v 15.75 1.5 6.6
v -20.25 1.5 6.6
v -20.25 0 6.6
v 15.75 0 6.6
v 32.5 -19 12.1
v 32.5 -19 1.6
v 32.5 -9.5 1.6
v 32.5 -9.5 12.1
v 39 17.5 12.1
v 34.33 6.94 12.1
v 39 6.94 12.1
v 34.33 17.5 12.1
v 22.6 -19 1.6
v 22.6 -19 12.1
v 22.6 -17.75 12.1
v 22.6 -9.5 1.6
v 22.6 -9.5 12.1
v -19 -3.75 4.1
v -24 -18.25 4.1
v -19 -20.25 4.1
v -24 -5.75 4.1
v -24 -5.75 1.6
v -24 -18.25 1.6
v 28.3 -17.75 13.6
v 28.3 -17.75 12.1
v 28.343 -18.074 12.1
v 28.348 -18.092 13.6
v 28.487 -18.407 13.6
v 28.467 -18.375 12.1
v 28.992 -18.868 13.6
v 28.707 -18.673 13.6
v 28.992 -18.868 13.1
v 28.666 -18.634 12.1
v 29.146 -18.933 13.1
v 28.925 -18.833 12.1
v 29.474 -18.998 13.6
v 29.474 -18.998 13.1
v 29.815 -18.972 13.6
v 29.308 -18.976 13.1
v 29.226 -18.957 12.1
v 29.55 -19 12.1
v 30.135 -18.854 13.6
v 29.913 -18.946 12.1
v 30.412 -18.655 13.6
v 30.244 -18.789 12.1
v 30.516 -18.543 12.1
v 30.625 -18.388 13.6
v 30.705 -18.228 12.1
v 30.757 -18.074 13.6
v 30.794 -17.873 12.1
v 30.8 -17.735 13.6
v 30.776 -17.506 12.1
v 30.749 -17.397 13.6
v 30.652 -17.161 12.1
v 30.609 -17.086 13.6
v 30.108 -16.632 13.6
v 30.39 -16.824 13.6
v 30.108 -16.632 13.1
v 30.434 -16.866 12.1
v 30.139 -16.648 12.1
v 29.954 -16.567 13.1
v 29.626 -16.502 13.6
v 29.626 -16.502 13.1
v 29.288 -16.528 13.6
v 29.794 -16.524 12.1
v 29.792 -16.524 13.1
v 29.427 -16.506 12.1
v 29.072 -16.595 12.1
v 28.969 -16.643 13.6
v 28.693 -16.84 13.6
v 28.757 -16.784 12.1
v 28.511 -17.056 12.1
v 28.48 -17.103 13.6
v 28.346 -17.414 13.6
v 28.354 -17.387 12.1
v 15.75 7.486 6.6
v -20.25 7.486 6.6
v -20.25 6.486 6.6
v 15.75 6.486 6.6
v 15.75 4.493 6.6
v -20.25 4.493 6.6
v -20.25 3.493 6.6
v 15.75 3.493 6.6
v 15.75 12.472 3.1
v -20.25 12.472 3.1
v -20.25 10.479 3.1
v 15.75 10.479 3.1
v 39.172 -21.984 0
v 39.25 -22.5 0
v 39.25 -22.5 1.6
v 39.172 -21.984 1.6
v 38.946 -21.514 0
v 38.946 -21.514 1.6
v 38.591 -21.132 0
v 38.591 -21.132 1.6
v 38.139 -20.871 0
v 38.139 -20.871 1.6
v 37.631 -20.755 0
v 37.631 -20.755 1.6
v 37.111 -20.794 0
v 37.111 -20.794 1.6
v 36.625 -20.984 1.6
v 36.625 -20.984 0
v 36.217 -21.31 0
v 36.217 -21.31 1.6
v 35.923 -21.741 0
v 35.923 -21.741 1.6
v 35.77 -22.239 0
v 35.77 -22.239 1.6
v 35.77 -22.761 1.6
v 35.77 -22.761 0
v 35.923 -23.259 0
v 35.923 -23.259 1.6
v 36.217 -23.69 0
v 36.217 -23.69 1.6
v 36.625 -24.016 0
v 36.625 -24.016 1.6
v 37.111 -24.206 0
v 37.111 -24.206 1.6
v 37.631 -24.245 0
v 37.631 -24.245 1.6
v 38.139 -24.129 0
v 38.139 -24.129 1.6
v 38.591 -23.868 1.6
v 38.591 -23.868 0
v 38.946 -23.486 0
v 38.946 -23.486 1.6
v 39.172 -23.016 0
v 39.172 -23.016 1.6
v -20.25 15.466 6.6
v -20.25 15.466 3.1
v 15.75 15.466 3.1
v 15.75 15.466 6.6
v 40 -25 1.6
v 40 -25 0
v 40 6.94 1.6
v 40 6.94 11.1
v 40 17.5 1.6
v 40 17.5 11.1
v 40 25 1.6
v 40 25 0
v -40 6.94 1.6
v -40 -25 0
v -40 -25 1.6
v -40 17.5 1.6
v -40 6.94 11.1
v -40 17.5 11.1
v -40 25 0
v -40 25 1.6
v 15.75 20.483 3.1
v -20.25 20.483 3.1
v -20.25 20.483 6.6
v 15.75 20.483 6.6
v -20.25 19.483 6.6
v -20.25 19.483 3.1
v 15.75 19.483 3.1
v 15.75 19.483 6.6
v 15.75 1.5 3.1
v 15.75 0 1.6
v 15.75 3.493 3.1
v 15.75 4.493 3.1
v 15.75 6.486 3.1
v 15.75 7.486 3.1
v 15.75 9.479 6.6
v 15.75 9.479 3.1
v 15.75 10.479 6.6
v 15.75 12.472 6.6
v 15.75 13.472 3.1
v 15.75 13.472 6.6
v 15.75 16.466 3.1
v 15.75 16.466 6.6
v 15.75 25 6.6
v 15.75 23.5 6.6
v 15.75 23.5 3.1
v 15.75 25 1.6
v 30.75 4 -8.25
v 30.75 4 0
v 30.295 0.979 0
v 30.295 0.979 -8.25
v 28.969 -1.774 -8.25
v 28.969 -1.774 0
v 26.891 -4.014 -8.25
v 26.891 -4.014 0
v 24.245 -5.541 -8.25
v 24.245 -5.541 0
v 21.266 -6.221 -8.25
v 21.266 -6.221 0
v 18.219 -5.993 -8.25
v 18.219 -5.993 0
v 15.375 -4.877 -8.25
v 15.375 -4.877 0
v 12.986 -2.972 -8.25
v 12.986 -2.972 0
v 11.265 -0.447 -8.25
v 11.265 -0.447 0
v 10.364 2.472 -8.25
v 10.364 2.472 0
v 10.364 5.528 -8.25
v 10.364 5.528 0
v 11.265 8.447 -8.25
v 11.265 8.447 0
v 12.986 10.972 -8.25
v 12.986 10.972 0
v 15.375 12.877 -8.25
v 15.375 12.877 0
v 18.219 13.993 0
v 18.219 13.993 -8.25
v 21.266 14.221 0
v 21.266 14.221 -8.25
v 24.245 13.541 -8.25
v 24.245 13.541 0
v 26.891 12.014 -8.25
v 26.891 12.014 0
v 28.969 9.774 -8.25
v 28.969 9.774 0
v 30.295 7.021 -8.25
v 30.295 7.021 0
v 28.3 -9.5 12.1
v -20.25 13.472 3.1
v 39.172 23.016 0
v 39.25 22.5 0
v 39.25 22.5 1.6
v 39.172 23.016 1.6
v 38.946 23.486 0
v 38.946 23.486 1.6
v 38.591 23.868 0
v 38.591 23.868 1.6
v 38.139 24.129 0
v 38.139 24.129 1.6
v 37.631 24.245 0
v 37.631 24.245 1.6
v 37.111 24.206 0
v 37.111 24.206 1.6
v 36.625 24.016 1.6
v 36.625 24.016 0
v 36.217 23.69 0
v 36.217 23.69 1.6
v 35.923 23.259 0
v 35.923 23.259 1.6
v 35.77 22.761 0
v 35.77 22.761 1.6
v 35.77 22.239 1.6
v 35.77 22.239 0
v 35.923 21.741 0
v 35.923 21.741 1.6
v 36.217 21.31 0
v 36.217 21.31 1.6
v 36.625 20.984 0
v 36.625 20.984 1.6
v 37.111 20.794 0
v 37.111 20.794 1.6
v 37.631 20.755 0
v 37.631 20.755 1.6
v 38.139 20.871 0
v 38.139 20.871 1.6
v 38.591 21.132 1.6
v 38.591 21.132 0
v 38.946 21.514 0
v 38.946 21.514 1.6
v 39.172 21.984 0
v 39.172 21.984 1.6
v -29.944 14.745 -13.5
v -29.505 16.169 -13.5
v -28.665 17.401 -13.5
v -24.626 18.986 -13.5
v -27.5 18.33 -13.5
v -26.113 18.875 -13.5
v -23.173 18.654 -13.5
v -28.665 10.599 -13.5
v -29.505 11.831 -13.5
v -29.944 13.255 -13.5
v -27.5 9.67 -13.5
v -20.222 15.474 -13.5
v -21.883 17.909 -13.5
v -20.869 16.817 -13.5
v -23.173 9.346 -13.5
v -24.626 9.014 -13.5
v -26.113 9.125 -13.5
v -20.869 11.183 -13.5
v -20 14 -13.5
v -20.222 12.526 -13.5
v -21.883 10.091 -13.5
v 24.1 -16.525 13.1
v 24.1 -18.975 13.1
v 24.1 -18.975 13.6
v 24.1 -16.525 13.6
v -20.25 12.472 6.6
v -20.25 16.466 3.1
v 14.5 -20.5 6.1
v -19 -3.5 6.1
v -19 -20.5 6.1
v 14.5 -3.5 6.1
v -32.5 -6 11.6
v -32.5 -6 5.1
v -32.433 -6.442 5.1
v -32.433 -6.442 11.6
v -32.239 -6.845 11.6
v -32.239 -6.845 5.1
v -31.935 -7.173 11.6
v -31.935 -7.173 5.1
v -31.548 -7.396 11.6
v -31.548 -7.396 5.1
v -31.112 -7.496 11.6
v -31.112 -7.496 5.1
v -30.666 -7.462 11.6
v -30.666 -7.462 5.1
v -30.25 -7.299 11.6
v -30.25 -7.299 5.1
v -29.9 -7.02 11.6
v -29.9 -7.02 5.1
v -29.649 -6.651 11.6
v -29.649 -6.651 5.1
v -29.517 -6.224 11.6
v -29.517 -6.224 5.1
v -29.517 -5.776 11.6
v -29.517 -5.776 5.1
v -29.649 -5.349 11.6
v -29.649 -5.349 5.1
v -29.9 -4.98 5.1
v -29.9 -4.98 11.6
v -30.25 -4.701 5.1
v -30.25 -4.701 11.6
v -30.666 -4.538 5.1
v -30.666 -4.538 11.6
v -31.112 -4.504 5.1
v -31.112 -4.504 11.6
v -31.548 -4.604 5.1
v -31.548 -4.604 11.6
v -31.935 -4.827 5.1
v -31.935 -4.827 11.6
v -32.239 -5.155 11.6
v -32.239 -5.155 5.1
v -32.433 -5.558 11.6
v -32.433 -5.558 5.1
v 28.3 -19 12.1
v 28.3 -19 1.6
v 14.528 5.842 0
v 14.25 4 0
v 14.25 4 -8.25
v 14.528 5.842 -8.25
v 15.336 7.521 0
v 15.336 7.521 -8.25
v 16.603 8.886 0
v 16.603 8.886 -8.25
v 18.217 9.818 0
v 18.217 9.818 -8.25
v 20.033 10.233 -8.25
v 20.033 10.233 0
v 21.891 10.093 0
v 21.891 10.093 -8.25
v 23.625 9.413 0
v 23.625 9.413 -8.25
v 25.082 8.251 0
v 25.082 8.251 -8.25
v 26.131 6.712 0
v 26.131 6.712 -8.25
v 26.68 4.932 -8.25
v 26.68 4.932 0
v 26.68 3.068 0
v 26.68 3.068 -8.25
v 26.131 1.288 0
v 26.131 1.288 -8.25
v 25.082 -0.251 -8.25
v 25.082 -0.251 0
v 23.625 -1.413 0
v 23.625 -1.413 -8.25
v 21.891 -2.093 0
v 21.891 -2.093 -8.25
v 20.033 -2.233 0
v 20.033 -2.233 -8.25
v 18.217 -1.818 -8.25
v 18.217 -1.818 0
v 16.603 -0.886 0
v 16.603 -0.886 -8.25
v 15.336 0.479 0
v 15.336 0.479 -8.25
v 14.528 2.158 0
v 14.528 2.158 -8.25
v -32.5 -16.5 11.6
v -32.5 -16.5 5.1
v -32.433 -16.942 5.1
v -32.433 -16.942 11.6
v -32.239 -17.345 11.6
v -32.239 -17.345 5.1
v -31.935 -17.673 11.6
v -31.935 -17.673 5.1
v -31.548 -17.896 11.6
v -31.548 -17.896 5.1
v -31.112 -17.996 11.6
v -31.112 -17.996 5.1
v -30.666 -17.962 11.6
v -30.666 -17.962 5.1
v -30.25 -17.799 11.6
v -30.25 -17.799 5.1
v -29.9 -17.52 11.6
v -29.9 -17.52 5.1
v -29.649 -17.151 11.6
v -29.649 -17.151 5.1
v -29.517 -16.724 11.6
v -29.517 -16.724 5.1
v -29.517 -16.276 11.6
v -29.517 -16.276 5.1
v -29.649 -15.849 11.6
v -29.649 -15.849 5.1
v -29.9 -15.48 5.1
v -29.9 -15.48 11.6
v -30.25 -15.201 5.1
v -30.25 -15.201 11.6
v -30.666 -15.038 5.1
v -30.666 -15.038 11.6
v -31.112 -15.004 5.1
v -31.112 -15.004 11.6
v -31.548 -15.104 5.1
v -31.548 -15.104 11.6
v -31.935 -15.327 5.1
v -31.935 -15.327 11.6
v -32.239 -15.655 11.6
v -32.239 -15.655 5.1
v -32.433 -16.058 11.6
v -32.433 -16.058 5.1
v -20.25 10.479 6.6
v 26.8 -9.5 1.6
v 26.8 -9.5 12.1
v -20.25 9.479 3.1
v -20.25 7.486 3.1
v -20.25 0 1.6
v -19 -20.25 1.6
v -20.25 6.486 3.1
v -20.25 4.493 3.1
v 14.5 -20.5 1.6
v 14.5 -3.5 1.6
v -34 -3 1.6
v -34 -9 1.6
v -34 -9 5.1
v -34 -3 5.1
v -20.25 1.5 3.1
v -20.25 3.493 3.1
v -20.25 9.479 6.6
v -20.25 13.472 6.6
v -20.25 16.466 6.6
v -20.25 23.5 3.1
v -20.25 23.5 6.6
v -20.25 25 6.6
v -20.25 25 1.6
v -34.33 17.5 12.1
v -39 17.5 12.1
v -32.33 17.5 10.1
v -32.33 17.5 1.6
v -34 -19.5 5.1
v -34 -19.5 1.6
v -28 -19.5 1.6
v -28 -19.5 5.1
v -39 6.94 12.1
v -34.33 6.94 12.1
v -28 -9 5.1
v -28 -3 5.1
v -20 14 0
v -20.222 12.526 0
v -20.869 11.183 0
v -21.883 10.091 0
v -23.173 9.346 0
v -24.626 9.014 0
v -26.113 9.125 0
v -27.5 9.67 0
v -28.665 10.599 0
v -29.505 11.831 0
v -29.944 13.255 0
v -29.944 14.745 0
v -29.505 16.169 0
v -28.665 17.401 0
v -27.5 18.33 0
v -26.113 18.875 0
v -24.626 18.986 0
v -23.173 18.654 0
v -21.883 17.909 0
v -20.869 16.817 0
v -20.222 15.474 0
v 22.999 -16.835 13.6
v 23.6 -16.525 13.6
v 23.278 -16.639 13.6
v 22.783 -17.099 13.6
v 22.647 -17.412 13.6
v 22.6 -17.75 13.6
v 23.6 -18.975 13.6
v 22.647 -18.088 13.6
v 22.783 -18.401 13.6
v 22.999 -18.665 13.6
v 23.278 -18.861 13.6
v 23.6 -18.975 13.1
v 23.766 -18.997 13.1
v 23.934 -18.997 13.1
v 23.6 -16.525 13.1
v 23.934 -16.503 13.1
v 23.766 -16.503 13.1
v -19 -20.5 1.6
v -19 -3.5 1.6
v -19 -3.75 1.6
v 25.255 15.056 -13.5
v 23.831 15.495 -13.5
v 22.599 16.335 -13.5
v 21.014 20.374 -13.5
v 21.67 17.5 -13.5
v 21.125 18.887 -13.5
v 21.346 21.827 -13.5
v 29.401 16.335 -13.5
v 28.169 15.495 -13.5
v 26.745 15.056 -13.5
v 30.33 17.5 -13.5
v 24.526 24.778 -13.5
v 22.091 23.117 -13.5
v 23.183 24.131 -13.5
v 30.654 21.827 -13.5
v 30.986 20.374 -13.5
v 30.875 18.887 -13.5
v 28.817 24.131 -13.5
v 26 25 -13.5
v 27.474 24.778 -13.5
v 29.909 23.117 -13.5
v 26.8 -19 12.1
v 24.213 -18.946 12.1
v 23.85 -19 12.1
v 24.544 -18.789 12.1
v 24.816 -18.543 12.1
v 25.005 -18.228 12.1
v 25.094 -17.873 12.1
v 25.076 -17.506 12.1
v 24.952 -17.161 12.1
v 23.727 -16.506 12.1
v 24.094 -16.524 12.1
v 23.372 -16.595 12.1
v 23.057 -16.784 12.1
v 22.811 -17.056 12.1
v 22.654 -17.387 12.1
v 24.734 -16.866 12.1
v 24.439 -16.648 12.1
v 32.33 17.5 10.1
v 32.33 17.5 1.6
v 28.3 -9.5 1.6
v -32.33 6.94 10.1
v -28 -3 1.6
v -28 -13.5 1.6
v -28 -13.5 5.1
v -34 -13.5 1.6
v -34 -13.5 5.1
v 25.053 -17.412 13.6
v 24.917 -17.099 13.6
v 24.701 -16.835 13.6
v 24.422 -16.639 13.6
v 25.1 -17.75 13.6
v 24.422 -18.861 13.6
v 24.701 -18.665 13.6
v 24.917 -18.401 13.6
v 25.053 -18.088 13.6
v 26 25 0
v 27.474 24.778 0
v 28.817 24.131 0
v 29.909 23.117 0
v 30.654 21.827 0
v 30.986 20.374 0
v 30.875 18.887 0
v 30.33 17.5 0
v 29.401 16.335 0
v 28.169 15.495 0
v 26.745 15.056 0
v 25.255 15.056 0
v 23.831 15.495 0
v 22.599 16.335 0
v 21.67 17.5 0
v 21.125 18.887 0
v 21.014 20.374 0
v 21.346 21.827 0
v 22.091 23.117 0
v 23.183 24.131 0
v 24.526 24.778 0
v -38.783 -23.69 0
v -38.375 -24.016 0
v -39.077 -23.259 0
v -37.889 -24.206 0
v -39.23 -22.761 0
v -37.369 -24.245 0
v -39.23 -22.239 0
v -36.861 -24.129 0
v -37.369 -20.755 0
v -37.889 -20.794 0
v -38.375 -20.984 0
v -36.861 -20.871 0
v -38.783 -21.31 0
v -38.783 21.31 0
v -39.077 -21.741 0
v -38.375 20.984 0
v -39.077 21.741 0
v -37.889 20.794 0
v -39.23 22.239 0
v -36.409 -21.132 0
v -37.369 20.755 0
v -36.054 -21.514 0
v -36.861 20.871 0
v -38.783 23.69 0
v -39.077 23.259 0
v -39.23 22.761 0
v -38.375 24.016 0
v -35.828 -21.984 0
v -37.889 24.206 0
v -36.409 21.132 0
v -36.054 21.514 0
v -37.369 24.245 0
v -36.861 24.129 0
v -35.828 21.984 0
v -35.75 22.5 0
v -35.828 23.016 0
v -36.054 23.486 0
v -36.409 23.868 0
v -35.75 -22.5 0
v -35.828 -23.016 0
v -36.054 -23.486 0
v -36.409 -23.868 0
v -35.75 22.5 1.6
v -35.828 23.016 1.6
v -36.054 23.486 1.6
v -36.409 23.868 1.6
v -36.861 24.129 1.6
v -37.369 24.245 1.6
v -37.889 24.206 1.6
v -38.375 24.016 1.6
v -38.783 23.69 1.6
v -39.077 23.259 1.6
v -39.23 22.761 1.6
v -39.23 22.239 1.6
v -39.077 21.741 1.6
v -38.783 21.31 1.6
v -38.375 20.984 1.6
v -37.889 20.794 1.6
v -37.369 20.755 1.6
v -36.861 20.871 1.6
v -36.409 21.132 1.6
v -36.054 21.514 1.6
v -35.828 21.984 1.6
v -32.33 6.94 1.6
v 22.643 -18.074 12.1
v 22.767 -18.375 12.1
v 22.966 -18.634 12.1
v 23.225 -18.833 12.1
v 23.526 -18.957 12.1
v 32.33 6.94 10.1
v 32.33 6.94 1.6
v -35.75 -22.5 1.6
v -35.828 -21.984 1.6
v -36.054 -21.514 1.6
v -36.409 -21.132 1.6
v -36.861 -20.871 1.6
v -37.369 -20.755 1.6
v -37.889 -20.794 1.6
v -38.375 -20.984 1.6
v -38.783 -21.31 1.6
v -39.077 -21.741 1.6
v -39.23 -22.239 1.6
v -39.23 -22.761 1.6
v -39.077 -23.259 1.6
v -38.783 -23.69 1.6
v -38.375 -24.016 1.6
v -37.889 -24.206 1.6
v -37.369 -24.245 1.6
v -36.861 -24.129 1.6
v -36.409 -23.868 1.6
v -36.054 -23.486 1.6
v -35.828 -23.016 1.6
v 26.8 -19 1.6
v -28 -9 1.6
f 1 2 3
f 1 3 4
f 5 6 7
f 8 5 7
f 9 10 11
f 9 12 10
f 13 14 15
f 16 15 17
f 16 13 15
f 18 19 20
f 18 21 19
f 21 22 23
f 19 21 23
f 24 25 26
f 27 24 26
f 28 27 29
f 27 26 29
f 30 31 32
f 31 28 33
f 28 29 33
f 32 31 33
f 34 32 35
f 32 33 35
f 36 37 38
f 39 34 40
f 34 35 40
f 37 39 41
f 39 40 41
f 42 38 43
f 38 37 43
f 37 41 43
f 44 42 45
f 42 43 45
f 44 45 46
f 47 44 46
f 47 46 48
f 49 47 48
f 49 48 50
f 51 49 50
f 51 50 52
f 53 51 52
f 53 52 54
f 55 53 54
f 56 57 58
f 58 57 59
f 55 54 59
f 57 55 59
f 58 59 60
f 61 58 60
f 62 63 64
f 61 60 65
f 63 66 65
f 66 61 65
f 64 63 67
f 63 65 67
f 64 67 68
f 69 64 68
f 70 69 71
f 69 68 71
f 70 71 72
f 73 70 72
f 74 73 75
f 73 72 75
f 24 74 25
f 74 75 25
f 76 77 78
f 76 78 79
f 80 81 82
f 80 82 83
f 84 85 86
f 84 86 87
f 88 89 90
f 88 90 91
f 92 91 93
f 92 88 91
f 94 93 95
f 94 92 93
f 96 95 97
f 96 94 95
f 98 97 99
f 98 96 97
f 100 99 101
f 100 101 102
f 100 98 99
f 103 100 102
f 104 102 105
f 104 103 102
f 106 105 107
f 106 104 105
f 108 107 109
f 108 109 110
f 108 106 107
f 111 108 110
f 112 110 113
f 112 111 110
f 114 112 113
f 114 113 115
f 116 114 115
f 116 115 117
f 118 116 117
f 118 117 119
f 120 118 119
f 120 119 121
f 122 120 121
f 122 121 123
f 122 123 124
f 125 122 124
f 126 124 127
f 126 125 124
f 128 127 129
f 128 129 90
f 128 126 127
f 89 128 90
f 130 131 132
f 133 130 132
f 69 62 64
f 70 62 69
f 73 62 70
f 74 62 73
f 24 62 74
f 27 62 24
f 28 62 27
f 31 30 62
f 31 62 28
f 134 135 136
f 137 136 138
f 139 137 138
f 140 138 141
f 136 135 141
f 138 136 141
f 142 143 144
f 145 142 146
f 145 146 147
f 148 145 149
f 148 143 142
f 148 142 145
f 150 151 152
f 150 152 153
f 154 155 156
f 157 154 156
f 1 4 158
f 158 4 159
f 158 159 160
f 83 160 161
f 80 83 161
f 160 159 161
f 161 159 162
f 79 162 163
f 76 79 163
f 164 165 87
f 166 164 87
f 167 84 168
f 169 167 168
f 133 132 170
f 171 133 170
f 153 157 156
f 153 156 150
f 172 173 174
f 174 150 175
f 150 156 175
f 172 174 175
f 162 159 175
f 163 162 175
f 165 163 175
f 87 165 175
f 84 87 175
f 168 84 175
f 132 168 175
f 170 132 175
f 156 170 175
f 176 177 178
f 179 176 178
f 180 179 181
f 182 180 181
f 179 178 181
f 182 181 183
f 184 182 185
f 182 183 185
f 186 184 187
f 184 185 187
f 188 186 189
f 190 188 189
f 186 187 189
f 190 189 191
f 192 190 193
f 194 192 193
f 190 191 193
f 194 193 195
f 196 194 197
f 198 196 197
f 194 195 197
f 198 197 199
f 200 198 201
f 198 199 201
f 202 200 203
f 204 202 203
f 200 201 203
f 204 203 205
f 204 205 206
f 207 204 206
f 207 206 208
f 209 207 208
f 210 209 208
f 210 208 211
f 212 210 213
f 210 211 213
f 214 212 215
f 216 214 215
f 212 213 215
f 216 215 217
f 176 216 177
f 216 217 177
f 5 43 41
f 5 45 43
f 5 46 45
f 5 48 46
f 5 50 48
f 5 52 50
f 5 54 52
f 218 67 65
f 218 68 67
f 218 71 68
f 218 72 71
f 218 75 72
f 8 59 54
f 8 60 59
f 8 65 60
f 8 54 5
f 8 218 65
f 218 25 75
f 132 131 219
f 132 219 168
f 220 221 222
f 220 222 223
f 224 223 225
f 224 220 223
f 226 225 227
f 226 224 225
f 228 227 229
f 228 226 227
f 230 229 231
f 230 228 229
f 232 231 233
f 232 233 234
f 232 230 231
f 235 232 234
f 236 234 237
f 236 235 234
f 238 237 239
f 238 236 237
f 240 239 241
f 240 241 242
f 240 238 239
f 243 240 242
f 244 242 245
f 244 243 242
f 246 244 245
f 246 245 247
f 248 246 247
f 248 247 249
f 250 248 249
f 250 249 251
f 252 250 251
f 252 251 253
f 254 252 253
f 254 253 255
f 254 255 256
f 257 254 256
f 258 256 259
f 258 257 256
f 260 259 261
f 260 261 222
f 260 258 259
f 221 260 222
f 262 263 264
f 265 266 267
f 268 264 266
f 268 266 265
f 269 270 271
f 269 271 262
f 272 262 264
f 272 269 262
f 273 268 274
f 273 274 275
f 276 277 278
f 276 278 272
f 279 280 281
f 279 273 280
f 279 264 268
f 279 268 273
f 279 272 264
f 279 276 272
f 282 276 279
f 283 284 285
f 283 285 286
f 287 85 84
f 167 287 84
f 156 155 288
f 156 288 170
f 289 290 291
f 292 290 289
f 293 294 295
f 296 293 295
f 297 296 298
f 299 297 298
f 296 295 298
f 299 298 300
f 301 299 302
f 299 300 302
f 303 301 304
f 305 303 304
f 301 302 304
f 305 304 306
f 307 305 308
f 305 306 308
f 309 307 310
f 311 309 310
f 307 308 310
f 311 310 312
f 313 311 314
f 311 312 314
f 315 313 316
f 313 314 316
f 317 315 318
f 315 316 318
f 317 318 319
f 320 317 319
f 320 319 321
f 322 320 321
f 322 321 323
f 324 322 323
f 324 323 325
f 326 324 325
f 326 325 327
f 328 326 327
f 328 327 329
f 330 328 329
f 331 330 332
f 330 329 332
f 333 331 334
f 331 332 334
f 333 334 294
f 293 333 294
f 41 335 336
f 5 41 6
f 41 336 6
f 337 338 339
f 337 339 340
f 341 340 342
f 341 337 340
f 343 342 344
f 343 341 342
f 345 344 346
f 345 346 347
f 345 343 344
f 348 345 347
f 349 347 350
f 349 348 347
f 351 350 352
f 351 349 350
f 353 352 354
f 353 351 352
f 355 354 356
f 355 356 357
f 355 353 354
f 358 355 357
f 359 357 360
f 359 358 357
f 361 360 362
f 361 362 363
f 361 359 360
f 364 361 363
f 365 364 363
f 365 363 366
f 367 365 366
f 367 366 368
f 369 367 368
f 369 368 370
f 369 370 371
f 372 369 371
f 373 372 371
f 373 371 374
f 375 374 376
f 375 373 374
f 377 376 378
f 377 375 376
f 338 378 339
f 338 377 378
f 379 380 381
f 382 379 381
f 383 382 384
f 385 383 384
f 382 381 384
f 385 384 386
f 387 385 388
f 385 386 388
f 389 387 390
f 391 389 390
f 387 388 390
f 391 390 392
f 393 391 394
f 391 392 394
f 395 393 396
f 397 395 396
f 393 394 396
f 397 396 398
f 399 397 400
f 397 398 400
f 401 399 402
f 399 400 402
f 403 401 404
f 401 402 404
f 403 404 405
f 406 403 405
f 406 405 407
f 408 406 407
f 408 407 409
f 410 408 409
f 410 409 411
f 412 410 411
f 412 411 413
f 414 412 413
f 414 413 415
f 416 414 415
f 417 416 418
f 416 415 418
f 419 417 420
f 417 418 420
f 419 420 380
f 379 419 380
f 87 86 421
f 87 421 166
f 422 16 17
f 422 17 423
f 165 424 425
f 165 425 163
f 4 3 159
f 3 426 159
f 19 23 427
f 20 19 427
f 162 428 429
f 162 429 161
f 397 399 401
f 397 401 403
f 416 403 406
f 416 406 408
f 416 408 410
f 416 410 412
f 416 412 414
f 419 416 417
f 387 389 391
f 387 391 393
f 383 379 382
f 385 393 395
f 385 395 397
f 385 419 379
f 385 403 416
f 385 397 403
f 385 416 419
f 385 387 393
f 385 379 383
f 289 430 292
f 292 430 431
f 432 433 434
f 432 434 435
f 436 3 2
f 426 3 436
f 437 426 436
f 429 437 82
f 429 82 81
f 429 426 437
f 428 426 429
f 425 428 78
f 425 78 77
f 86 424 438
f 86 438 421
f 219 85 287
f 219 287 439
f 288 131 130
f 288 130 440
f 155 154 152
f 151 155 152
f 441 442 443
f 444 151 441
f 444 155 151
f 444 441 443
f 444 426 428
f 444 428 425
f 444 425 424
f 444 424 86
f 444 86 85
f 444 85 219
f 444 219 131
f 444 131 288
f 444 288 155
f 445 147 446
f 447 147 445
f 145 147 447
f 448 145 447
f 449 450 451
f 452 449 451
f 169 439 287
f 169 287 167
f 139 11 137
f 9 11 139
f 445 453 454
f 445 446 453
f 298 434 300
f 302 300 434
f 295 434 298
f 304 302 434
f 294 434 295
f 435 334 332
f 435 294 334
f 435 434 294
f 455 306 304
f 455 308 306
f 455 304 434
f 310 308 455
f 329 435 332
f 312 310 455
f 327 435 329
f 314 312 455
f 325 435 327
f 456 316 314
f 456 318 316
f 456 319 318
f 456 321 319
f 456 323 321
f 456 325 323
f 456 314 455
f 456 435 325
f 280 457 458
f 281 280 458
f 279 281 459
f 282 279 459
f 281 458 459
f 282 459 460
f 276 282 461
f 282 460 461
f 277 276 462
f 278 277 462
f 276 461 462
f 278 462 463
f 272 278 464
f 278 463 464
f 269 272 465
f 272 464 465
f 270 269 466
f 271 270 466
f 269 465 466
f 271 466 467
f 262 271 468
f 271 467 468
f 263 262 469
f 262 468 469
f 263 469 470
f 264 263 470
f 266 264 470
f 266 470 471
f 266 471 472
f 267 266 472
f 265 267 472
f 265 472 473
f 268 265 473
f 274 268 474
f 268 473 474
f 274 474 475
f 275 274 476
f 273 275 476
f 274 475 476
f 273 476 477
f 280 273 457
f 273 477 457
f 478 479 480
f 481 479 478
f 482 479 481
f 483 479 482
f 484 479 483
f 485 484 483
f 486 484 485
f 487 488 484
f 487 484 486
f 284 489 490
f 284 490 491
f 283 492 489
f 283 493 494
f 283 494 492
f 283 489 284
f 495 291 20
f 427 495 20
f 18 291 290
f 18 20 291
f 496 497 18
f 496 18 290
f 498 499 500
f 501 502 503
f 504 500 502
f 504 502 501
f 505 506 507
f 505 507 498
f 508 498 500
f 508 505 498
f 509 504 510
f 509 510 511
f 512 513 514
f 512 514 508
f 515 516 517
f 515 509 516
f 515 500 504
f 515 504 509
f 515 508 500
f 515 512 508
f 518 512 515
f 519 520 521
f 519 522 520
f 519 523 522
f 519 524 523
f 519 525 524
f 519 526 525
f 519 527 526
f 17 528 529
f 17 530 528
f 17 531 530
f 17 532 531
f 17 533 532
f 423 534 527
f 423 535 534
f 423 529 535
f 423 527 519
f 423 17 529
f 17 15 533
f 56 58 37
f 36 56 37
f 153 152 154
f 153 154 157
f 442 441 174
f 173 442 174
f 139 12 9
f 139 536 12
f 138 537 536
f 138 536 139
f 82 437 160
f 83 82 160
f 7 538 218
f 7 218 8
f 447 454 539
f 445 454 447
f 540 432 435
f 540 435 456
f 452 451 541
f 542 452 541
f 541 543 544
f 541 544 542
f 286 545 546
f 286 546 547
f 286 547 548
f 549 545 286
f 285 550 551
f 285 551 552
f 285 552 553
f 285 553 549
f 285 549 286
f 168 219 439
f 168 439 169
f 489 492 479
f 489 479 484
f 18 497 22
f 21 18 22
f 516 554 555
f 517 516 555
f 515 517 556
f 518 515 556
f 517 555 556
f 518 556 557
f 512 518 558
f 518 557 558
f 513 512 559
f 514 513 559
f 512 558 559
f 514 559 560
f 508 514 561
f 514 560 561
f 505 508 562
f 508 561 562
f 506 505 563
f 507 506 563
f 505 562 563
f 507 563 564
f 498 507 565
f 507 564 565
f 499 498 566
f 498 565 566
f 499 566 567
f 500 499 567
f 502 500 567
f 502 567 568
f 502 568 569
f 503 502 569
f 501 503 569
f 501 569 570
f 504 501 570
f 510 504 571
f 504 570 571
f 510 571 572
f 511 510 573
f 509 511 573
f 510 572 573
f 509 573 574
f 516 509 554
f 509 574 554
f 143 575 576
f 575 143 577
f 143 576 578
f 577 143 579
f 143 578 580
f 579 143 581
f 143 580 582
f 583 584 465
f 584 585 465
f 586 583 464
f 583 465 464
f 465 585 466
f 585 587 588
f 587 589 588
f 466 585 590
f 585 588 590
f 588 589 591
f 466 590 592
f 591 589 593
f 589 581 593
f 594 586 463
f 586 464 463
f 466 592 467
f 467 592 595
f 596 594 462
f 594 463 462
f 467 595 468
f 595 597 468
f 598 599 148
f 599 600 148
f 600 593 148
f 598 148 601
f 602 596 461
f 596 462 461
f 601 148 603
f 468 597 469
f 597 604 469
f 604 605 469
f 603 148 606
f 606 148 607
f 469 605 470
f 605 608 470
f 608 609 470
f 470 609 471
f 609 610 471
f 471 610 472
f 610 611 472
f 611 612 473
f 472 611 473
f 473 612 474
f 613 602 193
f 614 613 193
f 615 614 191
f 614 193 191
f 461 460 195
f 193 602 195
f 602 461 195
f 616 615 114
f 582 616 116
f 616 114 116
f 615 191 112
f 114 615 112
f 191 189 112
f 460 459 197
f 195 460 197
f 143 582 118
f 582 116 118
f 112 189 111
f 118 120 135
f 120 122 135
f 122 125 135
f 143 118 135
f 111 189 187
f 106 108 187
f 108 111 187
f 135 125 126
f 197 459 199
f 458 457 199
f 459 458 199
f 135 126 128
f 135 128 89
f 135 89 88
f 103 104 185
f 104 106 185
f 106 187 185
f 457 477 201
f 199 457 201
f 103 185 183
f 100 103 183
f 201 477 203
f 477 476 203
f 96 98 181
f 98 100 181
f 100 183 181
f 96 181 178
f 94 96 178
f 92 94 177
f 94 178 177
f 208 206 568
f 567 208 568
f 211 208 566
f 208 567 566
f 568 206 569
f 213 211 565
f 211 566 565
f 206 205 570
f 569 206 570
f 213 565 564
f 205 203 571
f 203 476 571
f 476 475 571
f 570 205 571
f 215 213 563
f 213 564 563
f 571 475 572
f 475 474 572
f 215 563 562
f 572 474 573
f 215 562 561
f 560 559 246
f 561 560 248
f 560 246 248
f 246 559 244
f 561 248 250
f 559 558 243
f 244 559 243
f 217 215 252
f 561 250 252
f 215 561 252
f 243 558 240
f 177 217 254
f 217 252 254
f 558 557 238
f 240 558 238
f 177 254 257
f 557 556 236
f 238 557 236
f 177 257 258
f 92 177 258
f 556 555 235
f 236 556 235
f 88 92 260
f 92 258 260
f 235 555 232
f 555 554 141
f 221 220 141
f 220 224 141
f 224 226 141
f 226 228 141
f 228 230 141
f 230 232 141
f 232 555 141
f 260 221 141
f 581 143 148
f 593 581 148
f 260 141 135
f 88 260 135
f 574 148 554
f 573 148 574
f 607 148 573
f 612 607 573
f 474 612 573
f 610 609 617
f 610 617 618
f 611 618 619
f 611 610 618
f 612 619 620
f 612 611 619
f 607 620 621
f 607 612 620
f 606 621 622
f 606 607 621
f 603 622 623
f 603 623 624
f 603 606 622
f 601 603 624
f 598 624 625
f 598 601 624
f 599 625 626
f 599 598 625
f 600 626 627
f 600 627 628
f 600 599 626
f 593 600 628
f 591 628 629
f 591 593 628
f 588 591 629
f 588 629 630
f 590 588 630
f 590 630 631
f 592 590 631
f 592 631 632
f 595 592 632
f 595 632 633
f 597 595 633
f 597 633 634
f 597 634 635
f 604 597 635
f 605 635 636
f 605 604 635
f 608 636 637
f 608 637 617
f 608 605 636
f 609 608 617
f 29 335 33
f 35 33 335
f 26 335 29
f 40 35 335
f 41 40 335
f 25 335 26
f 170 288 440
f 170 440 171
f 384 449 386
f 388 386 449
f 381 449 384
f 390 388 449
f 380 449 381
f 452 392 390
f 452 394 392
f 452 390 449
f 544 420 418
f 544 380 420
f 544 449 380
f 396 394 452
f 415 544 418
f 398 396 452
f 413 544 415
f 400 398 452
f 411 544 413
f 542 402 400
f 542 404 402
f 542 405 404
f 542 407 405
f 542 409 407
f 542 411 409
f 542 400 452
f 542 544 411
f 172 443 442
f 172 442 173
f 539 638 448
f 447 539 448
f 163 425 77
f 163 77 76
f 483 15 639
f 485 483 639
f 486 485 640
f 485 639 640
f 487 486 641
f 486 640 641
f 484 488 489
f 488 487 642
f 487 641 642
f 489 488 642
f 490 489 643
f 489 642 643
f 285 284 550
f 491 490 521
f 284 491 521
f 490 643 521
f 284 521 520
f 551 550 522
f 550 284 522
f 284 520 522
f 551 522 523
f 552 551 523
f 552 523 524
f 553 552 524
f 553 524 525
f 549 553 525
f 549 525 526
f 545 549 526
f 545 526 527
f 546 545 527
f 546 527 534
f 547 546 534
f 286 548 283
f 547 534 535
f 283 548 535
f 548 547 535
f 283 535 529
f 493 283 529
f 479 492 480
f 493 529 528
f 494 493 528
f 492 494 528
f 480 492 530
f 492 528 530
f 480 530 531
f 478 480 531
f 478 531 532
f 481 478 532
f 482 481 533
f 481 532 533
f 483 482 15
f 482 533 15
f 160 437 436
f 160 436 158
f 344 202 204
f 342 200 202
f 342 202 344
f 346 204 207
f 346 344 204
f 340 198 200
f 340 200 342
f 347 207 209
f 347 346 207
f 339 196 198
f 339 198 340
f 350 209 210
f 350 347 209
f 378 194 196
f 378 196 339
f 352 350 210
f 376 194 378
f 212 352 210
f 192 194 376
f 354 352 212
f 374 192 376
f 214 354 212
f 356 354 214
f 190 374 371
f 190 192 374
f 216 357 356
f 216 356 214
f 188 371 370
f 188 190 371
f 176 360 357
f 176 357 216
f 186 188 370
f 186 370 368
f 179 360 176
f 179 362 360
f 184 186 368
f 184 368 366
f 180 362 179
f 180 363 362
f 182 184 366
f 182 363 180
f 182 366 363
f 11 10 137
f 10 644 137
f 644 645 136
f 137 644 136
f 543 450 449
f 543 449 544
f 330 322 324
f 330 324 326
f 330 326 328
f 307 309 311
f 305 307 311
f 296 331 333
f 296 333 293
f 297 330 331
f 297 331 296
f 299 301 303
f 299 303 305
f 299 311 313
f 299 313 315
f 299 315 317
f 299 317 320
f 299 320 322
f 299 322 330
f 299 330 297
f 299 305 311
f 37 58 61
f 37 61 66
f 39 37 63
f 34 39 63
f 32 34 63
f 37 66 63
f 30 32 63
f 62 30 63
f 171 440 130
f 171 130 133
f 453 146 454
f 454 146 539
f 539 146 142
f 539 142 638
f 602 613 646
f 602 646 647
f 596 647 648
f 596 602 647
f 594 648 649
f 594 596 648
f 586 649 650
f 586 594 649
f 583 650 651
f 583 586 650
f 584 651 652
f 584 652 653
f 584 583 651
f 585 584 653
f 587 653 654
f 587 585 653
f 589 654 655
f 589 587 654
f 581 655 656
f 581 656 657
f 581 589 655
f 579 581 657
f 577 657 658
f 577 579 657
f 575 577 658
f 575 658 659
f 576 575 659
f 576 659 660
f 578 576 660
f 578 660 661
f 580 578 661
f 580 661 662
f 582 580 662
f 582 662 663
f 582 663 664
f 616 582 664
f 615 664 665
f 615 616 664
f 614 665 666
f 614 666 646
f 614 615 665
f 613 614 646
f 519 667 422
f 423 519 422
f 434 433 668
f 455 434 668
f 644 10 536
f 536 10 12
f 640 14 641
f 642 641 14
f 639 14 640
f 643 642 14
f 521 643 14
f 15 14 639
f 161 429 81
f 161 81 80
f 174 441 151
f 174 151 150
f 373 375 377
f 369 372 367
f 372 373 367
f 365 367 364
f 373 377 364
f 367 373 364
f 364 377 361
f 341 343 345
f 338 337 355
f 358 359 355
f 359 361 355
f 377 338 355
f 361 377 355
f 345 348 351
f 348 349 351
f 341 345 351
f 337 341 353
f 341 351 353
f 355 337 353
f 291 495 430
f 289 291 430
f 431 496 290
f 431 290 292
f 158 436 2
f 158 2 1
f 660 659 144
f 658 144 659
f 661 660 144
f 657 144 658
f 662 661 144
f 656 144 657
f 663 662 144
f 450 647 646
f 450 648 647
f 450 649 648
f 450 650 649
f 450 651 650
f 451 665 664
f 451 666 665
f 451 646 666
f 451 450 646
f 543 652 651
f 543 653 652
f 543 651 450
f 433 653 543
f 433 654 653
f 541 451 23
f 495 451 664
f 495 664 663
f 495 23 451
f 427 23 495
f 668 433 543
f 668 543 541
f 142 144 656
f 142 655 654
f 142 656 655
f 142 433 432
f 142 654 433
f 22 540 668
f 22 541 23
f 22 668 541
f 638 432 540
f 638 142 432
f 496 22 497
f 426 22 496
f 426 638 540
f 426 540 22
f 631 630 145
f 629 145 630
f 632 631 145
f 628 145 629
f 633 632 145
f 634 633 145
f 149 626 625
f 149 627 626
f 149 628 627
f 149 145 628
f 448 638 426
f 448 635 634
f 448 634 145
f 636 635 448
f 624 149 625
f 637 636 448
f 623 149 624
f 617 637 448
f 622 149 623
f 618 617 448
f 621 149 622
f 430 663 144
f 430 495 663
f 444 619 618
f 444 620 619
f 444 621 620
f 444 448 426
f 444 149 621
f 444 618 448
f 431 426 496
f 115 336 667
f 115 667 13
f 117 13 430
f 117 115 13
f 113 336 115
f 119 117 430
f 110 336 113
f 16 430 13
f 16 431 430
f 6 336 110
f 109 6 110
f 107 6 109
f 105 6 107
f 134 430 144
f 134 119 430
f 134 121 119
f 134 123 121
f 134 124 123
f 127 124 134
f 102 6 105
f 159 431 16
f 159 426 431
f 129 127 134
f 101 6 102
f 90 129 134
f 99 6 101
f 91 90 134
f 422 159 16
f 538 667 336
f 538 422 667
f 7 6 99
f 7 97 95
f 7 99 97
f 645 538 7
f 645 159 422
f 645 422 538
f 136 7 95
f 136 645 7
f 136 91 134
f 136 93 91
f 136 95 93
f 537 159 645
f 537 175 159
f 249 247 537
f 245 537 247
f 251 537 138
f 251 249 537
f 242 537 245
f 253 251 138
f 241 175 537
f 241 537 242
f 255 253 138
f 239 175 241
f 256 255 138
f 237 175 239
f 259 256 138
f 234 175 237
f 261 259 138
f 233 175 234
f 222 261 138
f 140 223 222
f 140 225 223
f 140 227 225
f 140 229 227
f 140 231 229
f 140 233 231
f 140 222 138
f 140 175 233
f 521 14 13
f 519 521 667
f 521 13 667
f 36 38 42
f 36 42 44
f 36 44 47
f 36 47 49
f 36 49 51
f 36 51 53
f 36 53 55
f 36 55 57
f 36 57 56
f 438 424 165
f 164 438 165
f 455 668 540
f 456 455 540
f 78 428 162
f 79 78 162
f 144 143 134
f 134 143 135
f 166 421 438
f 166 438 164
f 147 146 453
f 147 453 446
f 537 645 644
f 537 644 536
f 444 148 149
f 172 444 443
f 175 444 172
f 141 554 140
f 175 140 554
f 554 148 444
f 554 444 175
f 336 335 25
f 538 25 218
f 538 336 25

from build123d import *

# Parameters (mm, degrees)
SKETCH1_W            = 80
SKETCH1_H            = 50
SKETCH1_R            = 1.75
BOSS_EXTRUDE1_DEPTH  = 1.6
SKETCH2_W            = 4.2
SKETCH2_H            = 9.5
SKETCH2_W_2          = 7.67
SKETCH2_H_2          = 10.56
BOSS_EXTRUDE2_DEPTH  = 10.5
CHAMFER1_SIZE        = 2
CHAMFER2_SIZE        = 1
SKETCH3_R            = 1.25
BOSS_EXTRUDE3_DEPTH  = 1.5
CUT_EXTRUDE1_START   = -0.5
CUT_EXTRUDE1_DEPTH   = 0.5
SKETCH5_W            = 33.5
SKETCH5_H            = 17
BOSS_EXTRUDE4_DEPTH  = 4.5
BOSS_EXTRUDE5_DEPTH  = 2.5
SKETCH7_W            = 6
SKETCH7_H            = 6
BOSS_EXTRUDE6_DEPTH  = 3.5
SKETCH8_R            = 1.5
BOSS_EXTRUDE7_DEPTH  = 6.5
SKETCH9_W            = 36
SKETCH9_H            = 25
BOSS_EXTRUDE8_DEPTH  = 1.5
SKETCH10_W           = 36
SKETCH10_H           = 1.5
SKETCH10_H_2         = 1
BOSS_EXTRUDE9_DEPTH  = 3.5
SKETCH11_R           = 5
BOSS_EXTRUDE10_DEPTH = 13.5
SKETCH12_R           = 10.25
SKETCH12_R_2         = 6.25
BOSS_EXTRUDE11_DEPTH = 8.25


with BuildPart() as part:
    # Sketch1 → Boss-Extrude1 (new body)
    with BuildSketch(Plane.XY):
        Rectangle(SKETCH1_W, SKETCH1_H)
        with Locations((-37.5, 22.5)):
            Circle(SKETCH1_R, mode=Mode.SUBTRACT)
        with Locations((-37.5, -22.5)):
            Circle(SKETCH1_R, mode=Mode.SUBTRACT)
        with Locations((37.5, -22.5)):
            Circle(SKETCH1_R, mode=Mode.SUBTRACT)
        with Locations((37.5, 22.5)):
            Circle(SKETCH1_R, mode=Mode.SUBTRACT)
    extrude(amount=BOSS_EXTRUDE1_DEPTH)

    # Sketch2 → Boss-Extrude2 (add)
    with BuildSketch(Plane.XY.offset(1.6)):
        with Locations((24.7, -14.25)):
            Rectangle(SKETCH2_W, SKETCH2_H)
        with Locations((30.4, -14.25)):
            Rectangle(SKETCH2_W, SKETCH2_H)
        with Locations((36.165, 12.22)):
            Rectangle(SKETCH2_W_2, SKETCH2_H_2)
        with Locations((-36.165, 12.22)):
            Rectangle(SKETCH2_W_2, SKETCH2_H_2)
    extrude(amount=BOSS_EXTRUDE2_DEPTH)

    # Chamfer1
    chamfer1_edges = [part.edges().sort_by_distance(p)[0] for p in [
        (32.33, 12.22, 12.1),
        (-32.33, 12.22, 12.1),
    ]]
    chamfer(chamfer1_edges, length=CHAMFER1_SIZE)

    # Chamfer2
    chamfer2_edges = [part.edges().sort_by_distance(p)[0] for p in [
        (40, 12.22, 12.1),
        (-40, 12.22, 12.1),
    ]]
    chamfer(chamfer2_edges, length=CHAMFER2_SIZE)

    # Sketch3 → Boss-Extrude3 (add)
    with BuildSketch(Plane.XY.offset(12.1)):
        with Locations(Location((23.85, -17.75, 0), (0, 0, 180))):
            Circle(SKETCH3_R)
        with Locations(Location((29.55, -17.75, 0), (0, 0, 180))):
            Circle(SKETCH3_R)
    extrude(amount=BOSS_EXTRUDE3_DEPTH)

    # Sketch4 → Cut-Extrude1 (cut)
    with BuildSketch(Plane.XY.offset(13.6).offset(CUT_EXTRUDE1_START)):
        with BuildLine():
            Line((23.6, -16.525255129), (23.6, -18.974744871))
            ThreePointArc((23.6, -18.974744871), (23.85, -19), (24.1, -18.974744871))
            Line((24.1, -18.974744871), (24.1, -16.525255129))
            ThreePointArc((24.1, -16.525255129), (23.85, -16.5), (23.6, -16.525255129))
        make_face()
        with BuildLine():
            Line((28.991531245, -18.868307941), (29.625505842, -16.502282537))
            ThreePointArc((29.625505842, -16.502282537), (29.873523806, -16.542592717), (30.108468755, -16.631692059))
            Line((30.108468755, -16.631692059), (29.474494158, -18.997717463))
            ThreePointArc((29.474494158, -18.997717463), (29.226476194, -18.957407283), (28.991531245, -18.868307941))
        make_face()
    extrude(amount=CUT_EXTRUDE1_DEPTH, mode=Mode.SUBTRACT)

    # Sketch5 → Boss-Extrude4 (add)
    with BuildSketch(Plane.XY.offset(1.6)):
        with Locations((-2.25, -12)):
            Rectangle(SKETCH5_W, SKETCH5_H)
    extrude(amount=BOSS_EXTRUDE4_DEPTH)

    # Sketch6 → Boss-Extrude5 (add)
    with BuildSketch(Plane.XY.offset(1.6)):
        Polygon((-24, -18.25), (-19, -20.25), (-19, -3.75), (-24, -5.75), align=None)
    extrude(amount=BOSS_EXTRUDE5_DEPTH)

    # Sketch7 → Boss-Extrude6 (add)
    with BuildSketch(Plane.XY.offset(1.6)):
        with Locations((-31, -16.5)):
            Rectangle(SKETCH7_W, SKETCH7_H)
        with Locations((-31, -6)):
            Rectangle(SKETCH7_W, SKETCH7_H)
    extrude(amount=BOSS_EXTRUDE6_DEPTH)

    # Sketch8 → Boss-Extrude7 (add)
    with BuildSketch(Plane.XY.offset(5.1)):
        with Locations(Location((-31, -6, 0), (0, 0, 180))):
            Circle(SKETCH8_R)
        with Locations(Location((-31, -16.5, 0), (0, 0, 180))):
            Circle(SKETCH8_R)
    extrude(amount=BOSS_EXTRUDE7_DEPTH)

    # Sketch9 → Boss-Extrude8 (add)
    with BuildSketch(Plane.XY.offset(1.6)):
        with Locations((-2.25, 12.5)):
            Rectangle(SKETCH9_W, SKETCH9_H)
    extrude(amount=BOSS_EXTRUDE8_DEPTH)

    # Sketch10 → Boss-Extrude9 (add)
    with BuildSketch(Plane.XY.offset(3.1)):
        with Locations((-2.25, 0.75)):
            Rectangle(SKETCH10_W, SKETCH10_H)
        with Locations((-2.25, 24.25)):
            Rectangle(SKETCH10_W, SKETCH10_H)
        with Locations((-2.25, 3.993100162)):
            Rectangle(SKETCH10_W, SKETCH10_H_2)
        with Locations((-2.25, 6.986200324)):
            Rectangle(SKETCH10_W, SKETCH10_H_2)
        with Locations((-2.25, 9.979300486)):
            Rectangle(SKETCH10_W, SKETCH10_H_2)
        with Locations((-2.25, 12.972400648)):
            Rectangle(SKETCH10_W, SKETCH10_H_2)
        with Locations((-2.25, 15.96550081)):
            Rectangle(SKETCH10_W, SKETCH10_H_2)
        with Locations((-2.25, 19.982750405)):
            Rectangle(SKETCH10_W, SKETCH10_H_2)
    extrude(amount=BOSS_EXTRUDE9_DEPTH)

    # Sketch11 → Boss-Extrude10 (add)
    with BuildSketch(Plane(origin=(0, 0, 0), x_dir=(-1, 0, 0), z_dir=(0, 0, -1))):
        with Locations(Location((-26, 20, 0), (0, 0, 90))):
            Circle(SKETCH11_R)
        with Locations(Location((25, 14, 0), (0, 0, 180))):
            Circle(SKETCH11_R)
    extrude(amount=BOSS_EXTRUDE10_DEPTH)

    # Sketch12 → Boss-Extrude11 (add)
    with BuildSketch(Plane(origin=(0, 0, 0), x_dir=(-1, 0, 0), z_dir=(0, 0, -1))):
        with Locations(Location((-20.5, 4, 0), (0, 0, 180))):
            Circle(SKETCH12_R)
        with Locations((-20.5, 4)):
            Circle(SKETCH12_R_2, mode=Mode.SUBTRACT)
    extrude(amount=BOSS_EXTRUDE11_DEPTH)


solid = part.part
